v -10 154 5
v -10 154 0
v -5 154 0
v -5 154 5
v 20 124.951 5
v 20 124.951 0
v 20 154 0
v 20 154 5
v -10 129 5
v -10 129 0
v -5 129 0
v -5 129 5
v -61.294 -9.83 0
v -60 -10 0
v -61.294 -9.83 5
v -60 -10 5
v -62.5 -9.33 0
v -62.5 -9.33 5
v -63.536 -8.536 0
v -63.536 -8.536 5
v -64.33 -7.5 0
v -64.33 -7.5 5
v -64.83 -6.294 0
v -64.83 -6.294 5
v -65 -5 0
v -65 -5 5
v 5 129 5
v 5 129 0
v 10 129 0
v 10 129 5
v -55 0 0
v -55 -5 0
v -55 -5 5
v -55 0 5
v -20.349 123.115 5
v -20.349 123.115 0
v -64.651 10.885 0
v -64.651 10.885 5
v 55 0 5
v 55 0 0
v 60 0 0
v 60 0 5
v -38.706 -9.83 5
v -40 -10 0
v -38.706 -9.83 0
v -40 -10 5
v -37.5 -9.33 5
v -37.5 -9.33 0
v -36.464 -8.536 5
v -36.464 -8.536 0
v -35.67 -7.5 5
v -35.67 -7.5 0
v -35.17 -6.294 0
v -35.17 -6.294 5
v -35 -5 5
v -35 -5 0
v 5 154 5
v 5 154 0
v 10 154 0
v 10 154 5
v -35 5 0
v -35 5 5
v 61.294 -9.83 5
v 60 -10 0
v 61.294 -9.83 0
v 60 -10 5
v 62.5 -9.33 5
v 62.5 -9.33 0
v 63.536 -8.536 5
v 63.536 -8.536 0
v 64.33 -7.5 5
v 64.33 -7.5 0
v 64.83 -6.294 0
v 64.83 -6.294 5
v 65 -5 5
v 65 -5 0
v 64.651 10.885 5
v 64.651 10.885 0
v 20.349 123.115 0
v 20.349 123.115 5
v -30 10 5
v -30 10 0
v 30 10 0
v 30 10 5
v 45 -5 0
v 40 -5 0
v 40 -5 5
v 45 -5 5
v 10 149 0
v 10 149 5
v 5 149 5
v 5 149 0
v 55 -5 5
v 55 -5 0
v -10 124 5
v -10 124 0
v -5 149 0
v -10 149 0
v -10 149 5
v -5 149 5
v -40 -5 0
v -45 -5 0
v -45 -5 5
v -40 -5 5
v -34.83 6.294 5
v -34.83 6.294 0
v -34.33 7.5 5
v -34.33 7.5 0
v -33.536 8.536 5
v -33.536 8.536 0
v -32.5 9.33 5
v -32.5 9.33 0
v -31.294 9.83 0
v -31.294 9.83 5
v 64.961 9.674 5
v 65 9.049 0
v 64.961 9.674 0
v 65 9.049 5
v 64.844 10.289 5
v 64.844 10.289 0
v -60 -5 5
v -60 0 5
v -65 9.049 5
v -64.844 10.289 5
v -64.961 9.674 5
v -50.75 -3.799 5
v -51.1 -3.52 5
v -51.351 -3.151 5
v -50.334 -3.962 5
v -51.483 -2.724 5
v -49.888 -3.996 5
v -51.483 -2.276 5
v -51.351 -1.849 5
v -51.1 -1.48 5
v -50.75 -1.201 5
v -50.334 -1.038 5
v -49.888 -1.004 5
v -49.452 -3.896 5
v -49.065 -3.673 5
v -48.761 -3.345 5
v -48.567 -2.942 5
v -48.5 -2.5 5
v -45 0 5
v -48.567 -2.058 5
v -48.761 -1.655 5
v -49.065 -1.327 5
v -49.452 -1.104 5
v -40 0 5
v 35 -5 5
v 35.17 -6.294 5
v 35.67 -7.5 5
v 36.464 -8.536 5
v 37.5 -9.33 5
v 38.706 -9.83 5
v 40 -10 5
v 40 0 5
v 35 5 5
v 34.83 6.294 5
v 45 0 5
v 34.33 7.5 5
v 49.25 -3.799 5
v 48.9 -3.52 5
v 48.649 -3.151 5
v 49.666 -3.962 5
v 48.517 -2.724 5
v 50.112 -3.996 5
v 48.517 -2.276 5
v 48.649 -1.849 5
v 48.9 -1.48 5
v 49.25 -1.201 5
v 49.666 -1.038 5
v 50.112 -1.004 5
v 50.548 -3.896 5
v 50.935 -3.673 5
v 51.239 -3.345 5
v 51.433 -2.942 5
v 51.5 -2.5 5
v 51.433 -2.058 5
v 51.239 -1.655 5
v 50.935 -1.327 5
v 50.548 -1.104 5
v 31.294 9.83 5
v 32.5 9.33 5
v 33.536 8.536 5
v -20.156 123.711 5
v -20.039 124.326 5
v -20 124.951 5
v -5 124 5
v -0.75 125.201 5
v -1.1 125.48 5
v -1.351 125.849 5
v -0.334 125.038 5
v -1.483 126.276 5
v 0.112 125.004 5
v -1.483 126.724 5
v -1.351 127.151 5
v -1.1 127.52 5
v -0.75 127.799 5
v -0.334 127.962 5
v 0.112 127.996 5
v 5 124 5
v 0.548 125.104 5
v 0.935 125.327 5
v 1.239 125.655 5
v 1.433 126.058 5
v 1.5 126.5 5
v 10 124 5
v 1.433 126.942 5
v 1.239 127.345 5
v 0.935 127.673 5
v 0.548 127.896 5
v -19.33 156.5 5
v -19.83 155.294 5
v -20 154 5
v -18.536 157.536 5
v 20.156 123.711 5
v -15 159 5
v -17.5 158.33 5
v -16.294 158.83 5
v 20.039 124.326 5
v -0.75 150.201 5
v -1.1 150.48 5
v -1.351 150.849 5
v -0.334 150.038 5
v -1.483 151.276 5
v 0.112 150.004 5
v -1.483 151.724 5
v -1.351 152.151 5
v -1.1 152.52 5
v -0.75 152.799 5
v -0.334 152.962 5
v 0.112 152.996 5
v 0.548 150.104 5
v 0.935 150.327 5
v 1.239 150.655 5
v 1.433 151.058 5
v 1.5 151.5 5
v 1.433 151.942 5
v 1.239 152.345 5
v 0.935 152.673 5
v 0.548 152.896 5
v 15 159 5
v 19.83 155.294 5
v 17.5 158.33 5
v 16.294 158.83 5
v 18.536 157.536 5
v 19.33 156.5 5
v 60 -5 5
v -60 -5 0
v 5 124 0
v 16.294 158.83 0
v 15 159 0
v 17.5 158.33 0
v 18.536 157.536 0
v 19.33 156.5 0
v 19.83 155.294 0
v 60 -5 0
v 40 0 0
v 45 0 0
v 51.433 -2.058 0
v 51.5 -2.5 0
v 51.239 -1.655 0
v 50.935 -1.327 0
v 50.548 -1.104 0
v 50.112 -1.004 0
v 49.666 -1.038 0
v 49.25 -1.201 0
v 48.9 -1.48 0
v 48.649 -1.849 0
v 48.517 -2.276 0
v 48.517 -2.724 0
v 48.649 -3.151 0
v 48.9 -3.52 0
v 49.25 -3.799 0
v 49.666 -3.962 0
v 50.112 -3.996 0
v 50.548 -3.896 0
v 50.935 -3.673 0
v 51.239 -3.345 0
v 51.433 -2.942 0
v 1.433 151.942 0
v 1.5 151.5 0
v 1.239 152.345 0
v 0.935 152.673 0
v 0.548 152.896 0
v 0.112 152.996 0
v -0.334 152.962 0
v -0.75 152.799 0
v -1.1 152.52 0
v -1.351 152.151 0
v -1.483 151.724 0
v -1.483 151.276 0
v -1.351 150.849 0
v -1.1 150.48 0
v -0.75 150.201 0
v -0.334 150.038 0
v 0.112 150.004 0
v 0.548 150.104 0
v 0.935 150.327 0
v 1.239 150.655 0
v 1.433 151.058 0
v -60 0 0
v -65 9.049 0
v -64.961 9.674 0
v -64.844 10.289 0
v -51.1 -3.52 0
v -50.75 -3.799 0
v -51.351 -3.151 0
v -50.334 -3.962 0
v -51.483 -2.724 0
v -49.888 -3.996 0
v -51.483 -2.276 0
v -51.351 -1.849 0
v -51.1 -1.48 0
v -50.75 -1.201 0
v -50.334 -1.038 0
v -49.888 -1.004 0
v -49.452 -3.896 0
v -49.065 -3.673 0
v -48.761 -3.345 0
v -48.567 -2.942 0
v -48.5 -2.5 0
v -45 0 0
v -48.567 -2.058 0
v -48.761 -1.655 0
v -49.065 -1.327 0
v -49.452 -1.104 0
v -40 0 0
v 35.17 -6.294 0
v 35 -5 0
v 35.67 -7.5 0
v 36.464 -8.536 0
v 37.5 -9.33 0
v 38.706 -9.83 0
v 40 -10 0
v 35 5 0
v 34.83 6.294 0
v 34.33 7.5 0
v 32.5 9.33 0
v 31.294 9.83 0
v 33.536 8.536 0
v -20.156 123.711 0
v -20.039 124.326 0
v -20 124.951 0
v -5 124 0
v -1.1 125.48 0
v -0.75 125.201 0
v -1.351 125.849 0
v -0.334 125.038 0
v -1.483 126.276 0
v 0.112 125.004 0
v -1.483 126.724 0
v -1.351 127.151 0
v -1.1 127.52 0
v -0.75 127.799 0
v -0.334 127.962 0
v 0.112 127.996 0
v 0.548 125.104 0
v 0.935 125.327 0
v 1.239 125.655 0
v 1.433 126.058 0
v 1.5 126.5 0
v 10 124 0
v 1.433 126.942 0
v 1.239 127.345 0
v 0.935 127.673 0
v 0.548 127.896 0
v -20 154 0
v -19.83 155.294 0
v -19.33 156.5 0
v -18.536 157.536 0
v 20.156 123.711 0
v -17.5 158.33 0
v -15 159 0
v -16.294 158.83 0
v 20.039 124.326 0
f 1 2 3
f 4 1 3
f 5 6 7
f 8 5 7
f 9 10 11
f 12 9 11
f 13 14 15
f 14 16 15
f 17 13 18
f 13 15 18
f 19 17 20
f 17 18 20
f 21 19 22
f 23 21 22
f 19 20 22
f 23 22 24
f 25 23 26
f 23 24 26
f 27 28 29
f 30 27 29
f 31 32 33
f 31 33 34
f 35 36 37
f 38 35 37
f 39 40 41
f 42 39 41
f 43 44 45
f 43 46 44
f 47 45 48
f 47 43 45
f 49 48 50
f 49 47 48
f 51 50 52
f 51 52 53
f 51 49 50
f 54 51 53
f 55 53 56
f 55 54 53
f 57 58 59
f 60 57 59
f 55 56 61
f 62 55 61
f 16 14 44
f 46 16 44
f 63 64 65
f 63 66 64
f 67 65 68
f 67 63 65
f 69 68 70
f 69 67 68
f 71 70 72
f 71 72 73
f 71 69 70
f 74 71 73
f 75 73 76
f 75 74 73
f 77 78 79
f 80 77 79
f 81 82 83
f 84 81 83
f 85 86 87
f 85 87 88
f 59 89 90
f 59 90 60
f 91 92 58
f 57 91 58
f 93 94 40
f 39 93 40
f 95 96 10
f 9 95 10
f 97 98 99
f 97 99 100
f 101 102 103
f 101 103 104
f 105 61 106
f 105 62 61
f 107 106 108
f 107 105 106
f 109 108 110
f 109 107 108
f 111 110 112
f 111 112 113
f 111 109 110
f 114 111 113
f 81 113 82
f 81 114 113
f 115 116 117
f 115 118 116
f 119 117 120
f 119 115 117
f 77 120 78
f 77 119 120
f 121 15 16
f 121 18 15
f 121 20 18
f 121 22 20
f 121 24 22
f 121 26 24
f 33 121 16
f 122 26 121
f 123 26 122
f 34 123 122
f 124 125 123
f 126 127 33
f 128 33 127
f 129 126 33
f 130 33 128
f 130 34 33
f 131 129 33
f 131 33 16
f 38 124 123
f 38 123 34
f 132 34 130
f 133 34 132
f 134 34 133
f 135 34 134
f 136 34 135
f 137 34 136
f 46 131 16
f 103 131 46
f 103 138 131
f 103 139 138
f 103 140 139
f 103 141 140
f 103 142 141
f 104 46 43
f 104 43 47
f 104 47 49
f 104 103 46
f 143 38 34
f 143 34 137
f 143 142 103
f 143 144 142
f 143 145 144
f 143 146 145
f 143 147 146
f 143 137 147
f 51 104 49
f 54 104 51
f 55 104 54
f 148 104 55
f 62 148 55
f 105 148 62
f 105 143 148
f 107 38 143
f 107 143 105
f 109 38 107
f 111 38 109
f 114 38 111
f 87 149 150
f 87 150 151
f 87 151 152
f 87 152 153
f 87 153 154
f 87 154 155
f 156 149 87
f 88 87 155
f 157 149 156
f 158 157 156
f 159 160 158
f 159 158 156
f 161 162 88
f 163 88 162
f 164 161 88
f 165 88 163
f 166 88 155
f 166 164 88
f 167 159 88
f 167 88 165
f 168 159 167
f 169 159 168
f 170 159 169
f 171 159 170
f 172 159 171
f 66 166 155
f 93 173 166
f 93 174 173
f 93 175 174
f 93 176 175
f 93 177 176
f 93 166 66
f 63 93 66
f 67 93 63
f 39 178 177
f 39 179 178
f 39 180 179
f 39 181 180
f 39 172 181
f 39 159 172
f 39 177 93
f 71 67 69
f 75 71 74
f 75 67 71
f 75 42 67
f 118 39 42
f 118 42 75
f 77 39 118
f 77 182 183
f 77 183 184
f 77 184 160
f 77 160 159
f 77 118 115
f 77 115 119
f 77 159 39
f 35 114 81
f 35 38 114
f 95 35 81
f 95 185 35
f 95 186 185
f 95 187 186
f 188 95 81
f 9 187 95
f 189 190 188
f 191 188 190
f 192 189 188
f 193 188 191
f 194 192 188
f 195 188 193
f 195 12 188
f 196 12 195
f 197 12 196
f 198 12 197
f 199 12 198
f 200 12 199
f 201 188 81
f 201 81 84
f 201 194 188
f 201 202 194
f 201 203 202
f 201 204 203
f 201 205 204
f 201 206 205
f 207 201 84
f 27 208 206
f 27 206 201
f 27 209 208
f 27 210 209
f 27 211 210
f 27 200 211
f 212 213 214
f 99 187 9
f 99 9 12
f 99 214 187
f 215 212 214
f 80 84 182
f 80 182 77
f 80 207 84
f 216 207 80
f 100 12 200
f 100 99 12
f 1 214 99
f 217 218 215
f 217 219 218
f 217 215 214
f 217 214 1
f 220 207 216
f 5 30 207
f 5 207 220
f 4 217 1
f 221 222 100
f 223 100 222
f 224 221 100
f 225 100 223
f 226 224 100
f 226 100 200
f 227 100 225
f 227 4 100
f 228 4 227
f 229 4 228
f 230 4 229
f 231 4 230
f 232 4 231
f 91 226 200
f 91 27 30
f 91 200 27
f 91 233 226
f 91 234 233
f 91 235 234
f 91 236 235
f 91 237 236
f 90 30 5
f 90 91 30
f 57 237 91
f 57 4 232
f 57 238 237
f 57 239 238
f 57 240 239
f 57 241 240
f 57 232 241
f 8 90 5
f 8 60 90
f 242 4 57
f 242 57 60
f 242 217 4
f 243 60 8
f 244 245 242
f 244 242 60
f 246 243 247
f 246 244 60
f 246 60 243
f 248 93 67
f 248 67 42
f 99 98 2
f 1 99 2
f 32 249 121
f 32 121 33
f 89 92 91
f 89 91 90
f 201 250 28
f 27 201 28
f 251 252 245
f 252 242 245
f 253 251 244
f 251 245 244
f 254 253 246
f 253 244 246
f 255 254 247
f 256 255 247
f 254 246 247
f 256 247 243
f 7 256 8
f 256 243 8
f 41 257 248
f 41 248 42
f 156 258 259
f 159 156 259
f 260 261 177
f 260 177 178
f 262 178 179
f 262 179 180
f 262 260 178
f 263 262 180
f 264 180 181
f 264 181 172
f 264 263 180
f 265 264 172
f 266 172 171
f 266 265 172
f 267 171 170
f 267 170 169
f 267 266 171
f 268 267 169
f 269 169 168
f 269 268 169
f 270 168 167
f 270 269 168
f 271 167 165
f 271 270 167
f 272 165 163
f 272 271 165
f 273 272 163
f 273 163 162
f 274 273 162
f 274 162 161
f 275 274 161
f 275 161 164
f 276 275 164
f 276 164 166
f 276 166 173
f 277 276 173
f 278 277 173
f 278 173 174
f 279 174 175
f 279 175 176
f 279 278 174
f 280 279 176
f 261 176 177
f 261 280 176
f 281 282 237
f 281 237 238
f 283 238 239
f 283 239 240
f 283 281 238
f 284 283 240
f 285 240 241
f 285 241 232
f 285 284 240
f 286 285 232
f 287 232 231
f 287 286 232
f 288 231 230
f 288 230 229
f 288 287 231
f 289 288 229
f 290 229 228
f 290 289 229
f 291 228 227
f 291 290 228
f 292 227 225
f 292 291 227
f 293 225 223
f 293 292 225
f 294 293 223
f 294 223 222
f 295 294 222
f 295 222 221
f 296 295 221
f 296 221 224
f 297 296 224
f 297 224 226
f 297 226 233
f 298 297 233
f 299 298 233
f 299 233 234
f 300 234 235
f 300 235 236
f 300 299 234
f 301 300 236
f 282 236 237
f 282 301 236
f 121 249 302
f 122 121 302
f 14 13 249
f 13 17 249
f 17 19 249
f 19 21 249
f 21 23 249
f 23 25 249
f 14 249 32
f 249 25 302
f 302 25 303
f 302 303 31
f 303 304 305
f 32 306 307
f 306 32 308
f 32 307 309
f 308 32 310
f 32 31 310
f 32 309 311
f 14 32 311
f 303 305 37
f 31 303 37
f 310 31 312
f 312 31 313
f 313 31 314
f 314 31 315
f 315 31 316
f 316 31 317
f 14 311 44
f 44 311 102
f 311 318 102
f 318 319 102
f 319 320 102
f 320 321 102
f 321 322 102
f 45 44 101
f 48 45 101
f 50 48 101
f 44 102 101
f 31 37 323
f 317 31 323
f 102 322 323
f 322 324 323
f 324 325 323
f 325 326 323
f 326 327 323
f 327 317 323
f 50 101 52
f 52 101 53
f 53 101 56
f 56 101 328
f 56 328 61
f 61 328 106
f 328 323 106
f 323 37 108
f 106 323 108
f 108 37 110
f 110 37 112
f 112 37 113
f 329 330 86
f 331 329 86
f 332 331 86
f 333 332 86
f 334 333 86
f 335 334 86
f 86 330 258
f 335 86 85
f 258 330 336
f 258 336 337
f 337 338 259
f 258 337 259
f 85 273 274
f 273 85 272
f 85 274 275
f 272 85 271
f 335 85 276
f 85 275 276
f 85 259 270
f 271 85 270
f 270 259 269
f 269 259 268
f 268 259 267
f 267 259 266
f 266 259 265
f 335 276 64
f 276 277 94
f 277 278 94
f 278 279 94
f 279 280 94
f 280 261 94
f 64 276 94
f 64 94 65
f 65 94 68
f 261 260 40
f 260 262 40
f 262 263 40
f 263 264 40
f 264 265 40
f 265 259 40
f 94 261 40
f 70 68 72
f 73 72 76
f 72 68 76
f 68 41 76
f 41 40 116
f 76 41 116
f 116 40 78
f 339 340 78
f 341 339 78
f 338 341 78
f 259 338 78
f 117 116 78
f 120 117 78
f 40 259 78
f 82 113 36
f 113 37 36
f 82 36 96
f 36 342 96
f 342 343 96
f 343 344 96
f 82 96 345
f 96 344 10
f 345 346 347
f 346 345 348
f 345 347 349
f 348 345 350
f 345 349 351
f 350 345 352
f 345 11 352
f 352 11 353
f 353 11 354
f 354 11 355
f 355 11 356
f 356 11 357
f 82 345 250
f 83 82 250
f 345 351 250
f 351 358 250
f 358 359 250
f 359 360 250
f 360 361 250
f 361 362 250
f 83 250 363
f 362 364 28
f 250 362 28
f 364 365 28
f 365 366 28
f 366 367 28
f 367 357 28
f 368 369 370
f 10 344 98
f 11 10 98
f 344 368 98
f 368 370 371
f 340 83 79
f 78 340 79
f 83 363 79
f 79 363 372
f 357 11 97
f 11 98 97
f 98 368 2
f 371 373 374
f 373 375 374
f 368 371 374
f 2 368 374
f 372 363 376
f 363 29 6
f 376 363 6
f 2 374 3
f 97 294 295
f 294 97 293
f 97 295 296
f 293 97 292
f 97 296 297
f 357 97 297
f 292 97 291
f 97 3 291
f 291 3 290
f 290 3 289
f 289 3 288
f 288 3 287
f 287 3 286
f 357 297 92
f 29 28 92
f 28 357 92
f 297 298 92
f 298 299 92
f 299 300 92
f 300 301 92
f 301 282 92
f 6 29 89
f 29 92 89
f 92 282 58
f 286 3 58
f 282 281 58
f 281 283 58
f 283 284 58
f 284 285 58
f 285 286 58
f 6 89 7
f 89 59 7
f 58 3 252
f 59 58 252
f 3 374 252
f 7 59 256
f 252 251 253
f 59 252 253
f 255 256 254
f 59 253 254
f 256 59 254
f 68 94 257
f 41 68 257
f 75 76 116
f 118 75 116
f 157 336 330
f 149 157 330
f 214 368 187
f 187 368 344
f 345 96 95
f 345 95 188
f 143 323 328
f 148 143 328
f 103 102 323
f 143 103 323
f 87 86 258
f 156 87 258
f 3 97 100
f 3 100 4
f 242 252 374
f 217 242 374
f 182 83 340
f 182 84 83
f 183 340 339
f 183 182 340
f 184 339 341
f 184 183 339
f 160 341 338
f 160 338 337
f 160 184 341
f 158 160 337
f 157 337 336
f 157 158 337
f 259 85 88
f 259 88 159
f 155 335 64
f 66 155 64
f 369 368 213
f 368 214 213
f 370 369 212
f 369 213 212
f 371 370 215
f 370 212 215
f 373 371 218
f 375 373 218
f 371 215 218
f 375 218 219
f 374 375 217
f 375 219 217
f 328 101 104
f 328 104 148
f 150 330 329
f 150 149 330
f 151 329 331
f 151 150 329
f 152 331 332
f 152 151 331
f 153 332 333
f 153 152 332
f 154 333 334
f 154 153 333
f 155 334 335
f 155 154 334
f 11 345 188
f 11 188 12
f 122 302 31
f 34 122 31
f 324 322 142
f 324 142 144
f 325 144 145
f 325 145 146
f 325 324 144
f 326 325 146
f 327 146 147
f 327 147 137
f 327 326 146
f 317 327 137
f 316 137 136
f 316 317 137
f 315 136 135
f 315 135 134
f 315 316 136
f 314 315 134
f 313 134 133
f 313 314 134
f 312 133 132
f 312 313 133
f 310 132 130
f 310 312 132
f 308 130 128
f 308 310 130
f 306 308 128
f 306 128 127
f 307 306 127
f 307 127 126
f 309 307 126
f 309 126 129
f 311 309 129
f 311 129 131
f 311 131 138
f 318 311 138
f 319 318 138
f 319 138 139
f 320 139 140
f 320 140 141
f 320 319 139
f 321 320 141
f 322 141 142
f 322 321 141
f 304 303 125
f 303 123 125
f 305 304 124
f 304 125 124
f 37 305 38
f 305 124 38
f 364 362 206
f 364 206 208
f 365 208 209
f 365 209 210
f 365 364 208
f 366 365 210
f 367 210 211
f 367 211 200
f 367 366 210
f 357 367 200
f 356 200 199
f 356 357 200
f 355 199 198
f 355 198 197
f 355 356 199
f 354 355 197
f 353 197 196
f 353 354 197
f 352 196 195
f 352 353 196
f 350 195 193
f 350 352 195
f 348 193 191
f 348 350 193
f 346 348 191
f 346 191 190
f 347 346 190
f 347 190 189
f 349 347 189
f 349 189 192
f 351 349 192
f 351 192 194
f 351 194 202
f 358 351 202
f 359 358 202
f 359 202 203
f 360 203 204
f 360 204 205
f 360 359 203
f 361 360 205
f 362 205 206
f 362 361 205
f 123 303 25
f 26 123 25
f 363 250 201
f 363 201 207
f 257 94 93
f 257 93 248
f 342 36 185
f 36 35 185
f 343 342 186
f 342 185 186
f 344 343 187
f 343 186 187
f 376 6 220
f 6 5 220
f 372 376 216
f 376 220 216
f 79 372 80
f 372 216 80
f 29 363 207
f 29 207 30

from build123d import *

# Parameters (mm, degrees)
SKETCH1_R           = 1.5
SKETCH1_W           = 5
SKETCH1_H           = 5
BOSS_EXTRUDE1_DEPTH = 5
FILLET1_R           = 5


with BuildPart() as part:
    # Sketch1 → Boss-Extrude1 (new body)
    with BuildSketch(Plane.XY):
        Polygon((-65, -10), (-35, -10), (-35, 10), (35, 10), (35, -10), (65, -10), (65, 10), (20, 124), (20, 159), (-20, 159), (-20, 124), (-65, 10), align=None)
        with Locations((50, -2.5)):
            Circle(SKETCH1_R, mode=Mode.SUBTRACT)
        with Locations((-50, -2.5)):
            Circle(SKETCH1_R, mode=Mode.SUBTRACT)
        with Locations((0, 126.5)):
            Circle(SKETCH1_R, mode=Mode.SUBTRACT)
        with Locations((0, 151.5)):
            Circle(SKETCH1_R, mode=Mode.SUBTRACT)
        with Locations((42.5, -2.5)):
            Rectangle(SKETCH1_W, SKETCH1_H, mode=Mode.SUBTRACT)
        with Locations((57.5, -2.5)):
            Rectangle(SKETCH1_W, SKETCH1_H, mode=Mode.SUBTRACT)
        with Locations((-57.5, -2.5)):
            Rectangle(SKETCH1_W, SKETCH1_H, mode=Mode.SUBTRACT)
        with Locations((-42.5, -2.5)):
            Rectangle(SKETCH1_W, SKETCH1_H, mode=Mode.SUBTRACT)
        with Locations((-7.5, 126.5)):
            Rectangle(SKETCH1_W, SKETCH1_H, mode=Mode.SUBTRACT)
        with Locations((7.5, 126.5)):
            Rectangle(SKETCH1_W, SKETCH1_H, mode=Mode.SUBTRACT)
        with Locations((-7.5, 151.5)):
            Rectangle(SKETCH1_W, SKETCH1_H, mode=Mode.SUBTRACT)
        with Locations((7.5, 151.5)):
            Rectangle(SKETCH1_W, SKETCH1_H, mode=Mode.SUBTRACT)
    extrude(amount=BOSS_EXTRUDE1_DEPTH)

    # Fillet1
    fillet1_edges = [part.edges().sort_by_distance(p)[0] for p in [
        (-65, 10, 2.5),
        (-20, 124, 2.5),
        (-20, 159, 2.5),
        (20, 159, 2.5),
        (20, 124, 2.5),
        (65, 10, 2.5),
        (65, -10, 2.5),
        (35, -10, 2.5),
        (35, 10, 2.5),
        (-35, 10, 2.5),
        (-35, -10, 2.5),
        (-65, -10, 2.5),
    ]]
    fillet(fillet1_edges, radius=FILLET1_R)


solid = part.part
